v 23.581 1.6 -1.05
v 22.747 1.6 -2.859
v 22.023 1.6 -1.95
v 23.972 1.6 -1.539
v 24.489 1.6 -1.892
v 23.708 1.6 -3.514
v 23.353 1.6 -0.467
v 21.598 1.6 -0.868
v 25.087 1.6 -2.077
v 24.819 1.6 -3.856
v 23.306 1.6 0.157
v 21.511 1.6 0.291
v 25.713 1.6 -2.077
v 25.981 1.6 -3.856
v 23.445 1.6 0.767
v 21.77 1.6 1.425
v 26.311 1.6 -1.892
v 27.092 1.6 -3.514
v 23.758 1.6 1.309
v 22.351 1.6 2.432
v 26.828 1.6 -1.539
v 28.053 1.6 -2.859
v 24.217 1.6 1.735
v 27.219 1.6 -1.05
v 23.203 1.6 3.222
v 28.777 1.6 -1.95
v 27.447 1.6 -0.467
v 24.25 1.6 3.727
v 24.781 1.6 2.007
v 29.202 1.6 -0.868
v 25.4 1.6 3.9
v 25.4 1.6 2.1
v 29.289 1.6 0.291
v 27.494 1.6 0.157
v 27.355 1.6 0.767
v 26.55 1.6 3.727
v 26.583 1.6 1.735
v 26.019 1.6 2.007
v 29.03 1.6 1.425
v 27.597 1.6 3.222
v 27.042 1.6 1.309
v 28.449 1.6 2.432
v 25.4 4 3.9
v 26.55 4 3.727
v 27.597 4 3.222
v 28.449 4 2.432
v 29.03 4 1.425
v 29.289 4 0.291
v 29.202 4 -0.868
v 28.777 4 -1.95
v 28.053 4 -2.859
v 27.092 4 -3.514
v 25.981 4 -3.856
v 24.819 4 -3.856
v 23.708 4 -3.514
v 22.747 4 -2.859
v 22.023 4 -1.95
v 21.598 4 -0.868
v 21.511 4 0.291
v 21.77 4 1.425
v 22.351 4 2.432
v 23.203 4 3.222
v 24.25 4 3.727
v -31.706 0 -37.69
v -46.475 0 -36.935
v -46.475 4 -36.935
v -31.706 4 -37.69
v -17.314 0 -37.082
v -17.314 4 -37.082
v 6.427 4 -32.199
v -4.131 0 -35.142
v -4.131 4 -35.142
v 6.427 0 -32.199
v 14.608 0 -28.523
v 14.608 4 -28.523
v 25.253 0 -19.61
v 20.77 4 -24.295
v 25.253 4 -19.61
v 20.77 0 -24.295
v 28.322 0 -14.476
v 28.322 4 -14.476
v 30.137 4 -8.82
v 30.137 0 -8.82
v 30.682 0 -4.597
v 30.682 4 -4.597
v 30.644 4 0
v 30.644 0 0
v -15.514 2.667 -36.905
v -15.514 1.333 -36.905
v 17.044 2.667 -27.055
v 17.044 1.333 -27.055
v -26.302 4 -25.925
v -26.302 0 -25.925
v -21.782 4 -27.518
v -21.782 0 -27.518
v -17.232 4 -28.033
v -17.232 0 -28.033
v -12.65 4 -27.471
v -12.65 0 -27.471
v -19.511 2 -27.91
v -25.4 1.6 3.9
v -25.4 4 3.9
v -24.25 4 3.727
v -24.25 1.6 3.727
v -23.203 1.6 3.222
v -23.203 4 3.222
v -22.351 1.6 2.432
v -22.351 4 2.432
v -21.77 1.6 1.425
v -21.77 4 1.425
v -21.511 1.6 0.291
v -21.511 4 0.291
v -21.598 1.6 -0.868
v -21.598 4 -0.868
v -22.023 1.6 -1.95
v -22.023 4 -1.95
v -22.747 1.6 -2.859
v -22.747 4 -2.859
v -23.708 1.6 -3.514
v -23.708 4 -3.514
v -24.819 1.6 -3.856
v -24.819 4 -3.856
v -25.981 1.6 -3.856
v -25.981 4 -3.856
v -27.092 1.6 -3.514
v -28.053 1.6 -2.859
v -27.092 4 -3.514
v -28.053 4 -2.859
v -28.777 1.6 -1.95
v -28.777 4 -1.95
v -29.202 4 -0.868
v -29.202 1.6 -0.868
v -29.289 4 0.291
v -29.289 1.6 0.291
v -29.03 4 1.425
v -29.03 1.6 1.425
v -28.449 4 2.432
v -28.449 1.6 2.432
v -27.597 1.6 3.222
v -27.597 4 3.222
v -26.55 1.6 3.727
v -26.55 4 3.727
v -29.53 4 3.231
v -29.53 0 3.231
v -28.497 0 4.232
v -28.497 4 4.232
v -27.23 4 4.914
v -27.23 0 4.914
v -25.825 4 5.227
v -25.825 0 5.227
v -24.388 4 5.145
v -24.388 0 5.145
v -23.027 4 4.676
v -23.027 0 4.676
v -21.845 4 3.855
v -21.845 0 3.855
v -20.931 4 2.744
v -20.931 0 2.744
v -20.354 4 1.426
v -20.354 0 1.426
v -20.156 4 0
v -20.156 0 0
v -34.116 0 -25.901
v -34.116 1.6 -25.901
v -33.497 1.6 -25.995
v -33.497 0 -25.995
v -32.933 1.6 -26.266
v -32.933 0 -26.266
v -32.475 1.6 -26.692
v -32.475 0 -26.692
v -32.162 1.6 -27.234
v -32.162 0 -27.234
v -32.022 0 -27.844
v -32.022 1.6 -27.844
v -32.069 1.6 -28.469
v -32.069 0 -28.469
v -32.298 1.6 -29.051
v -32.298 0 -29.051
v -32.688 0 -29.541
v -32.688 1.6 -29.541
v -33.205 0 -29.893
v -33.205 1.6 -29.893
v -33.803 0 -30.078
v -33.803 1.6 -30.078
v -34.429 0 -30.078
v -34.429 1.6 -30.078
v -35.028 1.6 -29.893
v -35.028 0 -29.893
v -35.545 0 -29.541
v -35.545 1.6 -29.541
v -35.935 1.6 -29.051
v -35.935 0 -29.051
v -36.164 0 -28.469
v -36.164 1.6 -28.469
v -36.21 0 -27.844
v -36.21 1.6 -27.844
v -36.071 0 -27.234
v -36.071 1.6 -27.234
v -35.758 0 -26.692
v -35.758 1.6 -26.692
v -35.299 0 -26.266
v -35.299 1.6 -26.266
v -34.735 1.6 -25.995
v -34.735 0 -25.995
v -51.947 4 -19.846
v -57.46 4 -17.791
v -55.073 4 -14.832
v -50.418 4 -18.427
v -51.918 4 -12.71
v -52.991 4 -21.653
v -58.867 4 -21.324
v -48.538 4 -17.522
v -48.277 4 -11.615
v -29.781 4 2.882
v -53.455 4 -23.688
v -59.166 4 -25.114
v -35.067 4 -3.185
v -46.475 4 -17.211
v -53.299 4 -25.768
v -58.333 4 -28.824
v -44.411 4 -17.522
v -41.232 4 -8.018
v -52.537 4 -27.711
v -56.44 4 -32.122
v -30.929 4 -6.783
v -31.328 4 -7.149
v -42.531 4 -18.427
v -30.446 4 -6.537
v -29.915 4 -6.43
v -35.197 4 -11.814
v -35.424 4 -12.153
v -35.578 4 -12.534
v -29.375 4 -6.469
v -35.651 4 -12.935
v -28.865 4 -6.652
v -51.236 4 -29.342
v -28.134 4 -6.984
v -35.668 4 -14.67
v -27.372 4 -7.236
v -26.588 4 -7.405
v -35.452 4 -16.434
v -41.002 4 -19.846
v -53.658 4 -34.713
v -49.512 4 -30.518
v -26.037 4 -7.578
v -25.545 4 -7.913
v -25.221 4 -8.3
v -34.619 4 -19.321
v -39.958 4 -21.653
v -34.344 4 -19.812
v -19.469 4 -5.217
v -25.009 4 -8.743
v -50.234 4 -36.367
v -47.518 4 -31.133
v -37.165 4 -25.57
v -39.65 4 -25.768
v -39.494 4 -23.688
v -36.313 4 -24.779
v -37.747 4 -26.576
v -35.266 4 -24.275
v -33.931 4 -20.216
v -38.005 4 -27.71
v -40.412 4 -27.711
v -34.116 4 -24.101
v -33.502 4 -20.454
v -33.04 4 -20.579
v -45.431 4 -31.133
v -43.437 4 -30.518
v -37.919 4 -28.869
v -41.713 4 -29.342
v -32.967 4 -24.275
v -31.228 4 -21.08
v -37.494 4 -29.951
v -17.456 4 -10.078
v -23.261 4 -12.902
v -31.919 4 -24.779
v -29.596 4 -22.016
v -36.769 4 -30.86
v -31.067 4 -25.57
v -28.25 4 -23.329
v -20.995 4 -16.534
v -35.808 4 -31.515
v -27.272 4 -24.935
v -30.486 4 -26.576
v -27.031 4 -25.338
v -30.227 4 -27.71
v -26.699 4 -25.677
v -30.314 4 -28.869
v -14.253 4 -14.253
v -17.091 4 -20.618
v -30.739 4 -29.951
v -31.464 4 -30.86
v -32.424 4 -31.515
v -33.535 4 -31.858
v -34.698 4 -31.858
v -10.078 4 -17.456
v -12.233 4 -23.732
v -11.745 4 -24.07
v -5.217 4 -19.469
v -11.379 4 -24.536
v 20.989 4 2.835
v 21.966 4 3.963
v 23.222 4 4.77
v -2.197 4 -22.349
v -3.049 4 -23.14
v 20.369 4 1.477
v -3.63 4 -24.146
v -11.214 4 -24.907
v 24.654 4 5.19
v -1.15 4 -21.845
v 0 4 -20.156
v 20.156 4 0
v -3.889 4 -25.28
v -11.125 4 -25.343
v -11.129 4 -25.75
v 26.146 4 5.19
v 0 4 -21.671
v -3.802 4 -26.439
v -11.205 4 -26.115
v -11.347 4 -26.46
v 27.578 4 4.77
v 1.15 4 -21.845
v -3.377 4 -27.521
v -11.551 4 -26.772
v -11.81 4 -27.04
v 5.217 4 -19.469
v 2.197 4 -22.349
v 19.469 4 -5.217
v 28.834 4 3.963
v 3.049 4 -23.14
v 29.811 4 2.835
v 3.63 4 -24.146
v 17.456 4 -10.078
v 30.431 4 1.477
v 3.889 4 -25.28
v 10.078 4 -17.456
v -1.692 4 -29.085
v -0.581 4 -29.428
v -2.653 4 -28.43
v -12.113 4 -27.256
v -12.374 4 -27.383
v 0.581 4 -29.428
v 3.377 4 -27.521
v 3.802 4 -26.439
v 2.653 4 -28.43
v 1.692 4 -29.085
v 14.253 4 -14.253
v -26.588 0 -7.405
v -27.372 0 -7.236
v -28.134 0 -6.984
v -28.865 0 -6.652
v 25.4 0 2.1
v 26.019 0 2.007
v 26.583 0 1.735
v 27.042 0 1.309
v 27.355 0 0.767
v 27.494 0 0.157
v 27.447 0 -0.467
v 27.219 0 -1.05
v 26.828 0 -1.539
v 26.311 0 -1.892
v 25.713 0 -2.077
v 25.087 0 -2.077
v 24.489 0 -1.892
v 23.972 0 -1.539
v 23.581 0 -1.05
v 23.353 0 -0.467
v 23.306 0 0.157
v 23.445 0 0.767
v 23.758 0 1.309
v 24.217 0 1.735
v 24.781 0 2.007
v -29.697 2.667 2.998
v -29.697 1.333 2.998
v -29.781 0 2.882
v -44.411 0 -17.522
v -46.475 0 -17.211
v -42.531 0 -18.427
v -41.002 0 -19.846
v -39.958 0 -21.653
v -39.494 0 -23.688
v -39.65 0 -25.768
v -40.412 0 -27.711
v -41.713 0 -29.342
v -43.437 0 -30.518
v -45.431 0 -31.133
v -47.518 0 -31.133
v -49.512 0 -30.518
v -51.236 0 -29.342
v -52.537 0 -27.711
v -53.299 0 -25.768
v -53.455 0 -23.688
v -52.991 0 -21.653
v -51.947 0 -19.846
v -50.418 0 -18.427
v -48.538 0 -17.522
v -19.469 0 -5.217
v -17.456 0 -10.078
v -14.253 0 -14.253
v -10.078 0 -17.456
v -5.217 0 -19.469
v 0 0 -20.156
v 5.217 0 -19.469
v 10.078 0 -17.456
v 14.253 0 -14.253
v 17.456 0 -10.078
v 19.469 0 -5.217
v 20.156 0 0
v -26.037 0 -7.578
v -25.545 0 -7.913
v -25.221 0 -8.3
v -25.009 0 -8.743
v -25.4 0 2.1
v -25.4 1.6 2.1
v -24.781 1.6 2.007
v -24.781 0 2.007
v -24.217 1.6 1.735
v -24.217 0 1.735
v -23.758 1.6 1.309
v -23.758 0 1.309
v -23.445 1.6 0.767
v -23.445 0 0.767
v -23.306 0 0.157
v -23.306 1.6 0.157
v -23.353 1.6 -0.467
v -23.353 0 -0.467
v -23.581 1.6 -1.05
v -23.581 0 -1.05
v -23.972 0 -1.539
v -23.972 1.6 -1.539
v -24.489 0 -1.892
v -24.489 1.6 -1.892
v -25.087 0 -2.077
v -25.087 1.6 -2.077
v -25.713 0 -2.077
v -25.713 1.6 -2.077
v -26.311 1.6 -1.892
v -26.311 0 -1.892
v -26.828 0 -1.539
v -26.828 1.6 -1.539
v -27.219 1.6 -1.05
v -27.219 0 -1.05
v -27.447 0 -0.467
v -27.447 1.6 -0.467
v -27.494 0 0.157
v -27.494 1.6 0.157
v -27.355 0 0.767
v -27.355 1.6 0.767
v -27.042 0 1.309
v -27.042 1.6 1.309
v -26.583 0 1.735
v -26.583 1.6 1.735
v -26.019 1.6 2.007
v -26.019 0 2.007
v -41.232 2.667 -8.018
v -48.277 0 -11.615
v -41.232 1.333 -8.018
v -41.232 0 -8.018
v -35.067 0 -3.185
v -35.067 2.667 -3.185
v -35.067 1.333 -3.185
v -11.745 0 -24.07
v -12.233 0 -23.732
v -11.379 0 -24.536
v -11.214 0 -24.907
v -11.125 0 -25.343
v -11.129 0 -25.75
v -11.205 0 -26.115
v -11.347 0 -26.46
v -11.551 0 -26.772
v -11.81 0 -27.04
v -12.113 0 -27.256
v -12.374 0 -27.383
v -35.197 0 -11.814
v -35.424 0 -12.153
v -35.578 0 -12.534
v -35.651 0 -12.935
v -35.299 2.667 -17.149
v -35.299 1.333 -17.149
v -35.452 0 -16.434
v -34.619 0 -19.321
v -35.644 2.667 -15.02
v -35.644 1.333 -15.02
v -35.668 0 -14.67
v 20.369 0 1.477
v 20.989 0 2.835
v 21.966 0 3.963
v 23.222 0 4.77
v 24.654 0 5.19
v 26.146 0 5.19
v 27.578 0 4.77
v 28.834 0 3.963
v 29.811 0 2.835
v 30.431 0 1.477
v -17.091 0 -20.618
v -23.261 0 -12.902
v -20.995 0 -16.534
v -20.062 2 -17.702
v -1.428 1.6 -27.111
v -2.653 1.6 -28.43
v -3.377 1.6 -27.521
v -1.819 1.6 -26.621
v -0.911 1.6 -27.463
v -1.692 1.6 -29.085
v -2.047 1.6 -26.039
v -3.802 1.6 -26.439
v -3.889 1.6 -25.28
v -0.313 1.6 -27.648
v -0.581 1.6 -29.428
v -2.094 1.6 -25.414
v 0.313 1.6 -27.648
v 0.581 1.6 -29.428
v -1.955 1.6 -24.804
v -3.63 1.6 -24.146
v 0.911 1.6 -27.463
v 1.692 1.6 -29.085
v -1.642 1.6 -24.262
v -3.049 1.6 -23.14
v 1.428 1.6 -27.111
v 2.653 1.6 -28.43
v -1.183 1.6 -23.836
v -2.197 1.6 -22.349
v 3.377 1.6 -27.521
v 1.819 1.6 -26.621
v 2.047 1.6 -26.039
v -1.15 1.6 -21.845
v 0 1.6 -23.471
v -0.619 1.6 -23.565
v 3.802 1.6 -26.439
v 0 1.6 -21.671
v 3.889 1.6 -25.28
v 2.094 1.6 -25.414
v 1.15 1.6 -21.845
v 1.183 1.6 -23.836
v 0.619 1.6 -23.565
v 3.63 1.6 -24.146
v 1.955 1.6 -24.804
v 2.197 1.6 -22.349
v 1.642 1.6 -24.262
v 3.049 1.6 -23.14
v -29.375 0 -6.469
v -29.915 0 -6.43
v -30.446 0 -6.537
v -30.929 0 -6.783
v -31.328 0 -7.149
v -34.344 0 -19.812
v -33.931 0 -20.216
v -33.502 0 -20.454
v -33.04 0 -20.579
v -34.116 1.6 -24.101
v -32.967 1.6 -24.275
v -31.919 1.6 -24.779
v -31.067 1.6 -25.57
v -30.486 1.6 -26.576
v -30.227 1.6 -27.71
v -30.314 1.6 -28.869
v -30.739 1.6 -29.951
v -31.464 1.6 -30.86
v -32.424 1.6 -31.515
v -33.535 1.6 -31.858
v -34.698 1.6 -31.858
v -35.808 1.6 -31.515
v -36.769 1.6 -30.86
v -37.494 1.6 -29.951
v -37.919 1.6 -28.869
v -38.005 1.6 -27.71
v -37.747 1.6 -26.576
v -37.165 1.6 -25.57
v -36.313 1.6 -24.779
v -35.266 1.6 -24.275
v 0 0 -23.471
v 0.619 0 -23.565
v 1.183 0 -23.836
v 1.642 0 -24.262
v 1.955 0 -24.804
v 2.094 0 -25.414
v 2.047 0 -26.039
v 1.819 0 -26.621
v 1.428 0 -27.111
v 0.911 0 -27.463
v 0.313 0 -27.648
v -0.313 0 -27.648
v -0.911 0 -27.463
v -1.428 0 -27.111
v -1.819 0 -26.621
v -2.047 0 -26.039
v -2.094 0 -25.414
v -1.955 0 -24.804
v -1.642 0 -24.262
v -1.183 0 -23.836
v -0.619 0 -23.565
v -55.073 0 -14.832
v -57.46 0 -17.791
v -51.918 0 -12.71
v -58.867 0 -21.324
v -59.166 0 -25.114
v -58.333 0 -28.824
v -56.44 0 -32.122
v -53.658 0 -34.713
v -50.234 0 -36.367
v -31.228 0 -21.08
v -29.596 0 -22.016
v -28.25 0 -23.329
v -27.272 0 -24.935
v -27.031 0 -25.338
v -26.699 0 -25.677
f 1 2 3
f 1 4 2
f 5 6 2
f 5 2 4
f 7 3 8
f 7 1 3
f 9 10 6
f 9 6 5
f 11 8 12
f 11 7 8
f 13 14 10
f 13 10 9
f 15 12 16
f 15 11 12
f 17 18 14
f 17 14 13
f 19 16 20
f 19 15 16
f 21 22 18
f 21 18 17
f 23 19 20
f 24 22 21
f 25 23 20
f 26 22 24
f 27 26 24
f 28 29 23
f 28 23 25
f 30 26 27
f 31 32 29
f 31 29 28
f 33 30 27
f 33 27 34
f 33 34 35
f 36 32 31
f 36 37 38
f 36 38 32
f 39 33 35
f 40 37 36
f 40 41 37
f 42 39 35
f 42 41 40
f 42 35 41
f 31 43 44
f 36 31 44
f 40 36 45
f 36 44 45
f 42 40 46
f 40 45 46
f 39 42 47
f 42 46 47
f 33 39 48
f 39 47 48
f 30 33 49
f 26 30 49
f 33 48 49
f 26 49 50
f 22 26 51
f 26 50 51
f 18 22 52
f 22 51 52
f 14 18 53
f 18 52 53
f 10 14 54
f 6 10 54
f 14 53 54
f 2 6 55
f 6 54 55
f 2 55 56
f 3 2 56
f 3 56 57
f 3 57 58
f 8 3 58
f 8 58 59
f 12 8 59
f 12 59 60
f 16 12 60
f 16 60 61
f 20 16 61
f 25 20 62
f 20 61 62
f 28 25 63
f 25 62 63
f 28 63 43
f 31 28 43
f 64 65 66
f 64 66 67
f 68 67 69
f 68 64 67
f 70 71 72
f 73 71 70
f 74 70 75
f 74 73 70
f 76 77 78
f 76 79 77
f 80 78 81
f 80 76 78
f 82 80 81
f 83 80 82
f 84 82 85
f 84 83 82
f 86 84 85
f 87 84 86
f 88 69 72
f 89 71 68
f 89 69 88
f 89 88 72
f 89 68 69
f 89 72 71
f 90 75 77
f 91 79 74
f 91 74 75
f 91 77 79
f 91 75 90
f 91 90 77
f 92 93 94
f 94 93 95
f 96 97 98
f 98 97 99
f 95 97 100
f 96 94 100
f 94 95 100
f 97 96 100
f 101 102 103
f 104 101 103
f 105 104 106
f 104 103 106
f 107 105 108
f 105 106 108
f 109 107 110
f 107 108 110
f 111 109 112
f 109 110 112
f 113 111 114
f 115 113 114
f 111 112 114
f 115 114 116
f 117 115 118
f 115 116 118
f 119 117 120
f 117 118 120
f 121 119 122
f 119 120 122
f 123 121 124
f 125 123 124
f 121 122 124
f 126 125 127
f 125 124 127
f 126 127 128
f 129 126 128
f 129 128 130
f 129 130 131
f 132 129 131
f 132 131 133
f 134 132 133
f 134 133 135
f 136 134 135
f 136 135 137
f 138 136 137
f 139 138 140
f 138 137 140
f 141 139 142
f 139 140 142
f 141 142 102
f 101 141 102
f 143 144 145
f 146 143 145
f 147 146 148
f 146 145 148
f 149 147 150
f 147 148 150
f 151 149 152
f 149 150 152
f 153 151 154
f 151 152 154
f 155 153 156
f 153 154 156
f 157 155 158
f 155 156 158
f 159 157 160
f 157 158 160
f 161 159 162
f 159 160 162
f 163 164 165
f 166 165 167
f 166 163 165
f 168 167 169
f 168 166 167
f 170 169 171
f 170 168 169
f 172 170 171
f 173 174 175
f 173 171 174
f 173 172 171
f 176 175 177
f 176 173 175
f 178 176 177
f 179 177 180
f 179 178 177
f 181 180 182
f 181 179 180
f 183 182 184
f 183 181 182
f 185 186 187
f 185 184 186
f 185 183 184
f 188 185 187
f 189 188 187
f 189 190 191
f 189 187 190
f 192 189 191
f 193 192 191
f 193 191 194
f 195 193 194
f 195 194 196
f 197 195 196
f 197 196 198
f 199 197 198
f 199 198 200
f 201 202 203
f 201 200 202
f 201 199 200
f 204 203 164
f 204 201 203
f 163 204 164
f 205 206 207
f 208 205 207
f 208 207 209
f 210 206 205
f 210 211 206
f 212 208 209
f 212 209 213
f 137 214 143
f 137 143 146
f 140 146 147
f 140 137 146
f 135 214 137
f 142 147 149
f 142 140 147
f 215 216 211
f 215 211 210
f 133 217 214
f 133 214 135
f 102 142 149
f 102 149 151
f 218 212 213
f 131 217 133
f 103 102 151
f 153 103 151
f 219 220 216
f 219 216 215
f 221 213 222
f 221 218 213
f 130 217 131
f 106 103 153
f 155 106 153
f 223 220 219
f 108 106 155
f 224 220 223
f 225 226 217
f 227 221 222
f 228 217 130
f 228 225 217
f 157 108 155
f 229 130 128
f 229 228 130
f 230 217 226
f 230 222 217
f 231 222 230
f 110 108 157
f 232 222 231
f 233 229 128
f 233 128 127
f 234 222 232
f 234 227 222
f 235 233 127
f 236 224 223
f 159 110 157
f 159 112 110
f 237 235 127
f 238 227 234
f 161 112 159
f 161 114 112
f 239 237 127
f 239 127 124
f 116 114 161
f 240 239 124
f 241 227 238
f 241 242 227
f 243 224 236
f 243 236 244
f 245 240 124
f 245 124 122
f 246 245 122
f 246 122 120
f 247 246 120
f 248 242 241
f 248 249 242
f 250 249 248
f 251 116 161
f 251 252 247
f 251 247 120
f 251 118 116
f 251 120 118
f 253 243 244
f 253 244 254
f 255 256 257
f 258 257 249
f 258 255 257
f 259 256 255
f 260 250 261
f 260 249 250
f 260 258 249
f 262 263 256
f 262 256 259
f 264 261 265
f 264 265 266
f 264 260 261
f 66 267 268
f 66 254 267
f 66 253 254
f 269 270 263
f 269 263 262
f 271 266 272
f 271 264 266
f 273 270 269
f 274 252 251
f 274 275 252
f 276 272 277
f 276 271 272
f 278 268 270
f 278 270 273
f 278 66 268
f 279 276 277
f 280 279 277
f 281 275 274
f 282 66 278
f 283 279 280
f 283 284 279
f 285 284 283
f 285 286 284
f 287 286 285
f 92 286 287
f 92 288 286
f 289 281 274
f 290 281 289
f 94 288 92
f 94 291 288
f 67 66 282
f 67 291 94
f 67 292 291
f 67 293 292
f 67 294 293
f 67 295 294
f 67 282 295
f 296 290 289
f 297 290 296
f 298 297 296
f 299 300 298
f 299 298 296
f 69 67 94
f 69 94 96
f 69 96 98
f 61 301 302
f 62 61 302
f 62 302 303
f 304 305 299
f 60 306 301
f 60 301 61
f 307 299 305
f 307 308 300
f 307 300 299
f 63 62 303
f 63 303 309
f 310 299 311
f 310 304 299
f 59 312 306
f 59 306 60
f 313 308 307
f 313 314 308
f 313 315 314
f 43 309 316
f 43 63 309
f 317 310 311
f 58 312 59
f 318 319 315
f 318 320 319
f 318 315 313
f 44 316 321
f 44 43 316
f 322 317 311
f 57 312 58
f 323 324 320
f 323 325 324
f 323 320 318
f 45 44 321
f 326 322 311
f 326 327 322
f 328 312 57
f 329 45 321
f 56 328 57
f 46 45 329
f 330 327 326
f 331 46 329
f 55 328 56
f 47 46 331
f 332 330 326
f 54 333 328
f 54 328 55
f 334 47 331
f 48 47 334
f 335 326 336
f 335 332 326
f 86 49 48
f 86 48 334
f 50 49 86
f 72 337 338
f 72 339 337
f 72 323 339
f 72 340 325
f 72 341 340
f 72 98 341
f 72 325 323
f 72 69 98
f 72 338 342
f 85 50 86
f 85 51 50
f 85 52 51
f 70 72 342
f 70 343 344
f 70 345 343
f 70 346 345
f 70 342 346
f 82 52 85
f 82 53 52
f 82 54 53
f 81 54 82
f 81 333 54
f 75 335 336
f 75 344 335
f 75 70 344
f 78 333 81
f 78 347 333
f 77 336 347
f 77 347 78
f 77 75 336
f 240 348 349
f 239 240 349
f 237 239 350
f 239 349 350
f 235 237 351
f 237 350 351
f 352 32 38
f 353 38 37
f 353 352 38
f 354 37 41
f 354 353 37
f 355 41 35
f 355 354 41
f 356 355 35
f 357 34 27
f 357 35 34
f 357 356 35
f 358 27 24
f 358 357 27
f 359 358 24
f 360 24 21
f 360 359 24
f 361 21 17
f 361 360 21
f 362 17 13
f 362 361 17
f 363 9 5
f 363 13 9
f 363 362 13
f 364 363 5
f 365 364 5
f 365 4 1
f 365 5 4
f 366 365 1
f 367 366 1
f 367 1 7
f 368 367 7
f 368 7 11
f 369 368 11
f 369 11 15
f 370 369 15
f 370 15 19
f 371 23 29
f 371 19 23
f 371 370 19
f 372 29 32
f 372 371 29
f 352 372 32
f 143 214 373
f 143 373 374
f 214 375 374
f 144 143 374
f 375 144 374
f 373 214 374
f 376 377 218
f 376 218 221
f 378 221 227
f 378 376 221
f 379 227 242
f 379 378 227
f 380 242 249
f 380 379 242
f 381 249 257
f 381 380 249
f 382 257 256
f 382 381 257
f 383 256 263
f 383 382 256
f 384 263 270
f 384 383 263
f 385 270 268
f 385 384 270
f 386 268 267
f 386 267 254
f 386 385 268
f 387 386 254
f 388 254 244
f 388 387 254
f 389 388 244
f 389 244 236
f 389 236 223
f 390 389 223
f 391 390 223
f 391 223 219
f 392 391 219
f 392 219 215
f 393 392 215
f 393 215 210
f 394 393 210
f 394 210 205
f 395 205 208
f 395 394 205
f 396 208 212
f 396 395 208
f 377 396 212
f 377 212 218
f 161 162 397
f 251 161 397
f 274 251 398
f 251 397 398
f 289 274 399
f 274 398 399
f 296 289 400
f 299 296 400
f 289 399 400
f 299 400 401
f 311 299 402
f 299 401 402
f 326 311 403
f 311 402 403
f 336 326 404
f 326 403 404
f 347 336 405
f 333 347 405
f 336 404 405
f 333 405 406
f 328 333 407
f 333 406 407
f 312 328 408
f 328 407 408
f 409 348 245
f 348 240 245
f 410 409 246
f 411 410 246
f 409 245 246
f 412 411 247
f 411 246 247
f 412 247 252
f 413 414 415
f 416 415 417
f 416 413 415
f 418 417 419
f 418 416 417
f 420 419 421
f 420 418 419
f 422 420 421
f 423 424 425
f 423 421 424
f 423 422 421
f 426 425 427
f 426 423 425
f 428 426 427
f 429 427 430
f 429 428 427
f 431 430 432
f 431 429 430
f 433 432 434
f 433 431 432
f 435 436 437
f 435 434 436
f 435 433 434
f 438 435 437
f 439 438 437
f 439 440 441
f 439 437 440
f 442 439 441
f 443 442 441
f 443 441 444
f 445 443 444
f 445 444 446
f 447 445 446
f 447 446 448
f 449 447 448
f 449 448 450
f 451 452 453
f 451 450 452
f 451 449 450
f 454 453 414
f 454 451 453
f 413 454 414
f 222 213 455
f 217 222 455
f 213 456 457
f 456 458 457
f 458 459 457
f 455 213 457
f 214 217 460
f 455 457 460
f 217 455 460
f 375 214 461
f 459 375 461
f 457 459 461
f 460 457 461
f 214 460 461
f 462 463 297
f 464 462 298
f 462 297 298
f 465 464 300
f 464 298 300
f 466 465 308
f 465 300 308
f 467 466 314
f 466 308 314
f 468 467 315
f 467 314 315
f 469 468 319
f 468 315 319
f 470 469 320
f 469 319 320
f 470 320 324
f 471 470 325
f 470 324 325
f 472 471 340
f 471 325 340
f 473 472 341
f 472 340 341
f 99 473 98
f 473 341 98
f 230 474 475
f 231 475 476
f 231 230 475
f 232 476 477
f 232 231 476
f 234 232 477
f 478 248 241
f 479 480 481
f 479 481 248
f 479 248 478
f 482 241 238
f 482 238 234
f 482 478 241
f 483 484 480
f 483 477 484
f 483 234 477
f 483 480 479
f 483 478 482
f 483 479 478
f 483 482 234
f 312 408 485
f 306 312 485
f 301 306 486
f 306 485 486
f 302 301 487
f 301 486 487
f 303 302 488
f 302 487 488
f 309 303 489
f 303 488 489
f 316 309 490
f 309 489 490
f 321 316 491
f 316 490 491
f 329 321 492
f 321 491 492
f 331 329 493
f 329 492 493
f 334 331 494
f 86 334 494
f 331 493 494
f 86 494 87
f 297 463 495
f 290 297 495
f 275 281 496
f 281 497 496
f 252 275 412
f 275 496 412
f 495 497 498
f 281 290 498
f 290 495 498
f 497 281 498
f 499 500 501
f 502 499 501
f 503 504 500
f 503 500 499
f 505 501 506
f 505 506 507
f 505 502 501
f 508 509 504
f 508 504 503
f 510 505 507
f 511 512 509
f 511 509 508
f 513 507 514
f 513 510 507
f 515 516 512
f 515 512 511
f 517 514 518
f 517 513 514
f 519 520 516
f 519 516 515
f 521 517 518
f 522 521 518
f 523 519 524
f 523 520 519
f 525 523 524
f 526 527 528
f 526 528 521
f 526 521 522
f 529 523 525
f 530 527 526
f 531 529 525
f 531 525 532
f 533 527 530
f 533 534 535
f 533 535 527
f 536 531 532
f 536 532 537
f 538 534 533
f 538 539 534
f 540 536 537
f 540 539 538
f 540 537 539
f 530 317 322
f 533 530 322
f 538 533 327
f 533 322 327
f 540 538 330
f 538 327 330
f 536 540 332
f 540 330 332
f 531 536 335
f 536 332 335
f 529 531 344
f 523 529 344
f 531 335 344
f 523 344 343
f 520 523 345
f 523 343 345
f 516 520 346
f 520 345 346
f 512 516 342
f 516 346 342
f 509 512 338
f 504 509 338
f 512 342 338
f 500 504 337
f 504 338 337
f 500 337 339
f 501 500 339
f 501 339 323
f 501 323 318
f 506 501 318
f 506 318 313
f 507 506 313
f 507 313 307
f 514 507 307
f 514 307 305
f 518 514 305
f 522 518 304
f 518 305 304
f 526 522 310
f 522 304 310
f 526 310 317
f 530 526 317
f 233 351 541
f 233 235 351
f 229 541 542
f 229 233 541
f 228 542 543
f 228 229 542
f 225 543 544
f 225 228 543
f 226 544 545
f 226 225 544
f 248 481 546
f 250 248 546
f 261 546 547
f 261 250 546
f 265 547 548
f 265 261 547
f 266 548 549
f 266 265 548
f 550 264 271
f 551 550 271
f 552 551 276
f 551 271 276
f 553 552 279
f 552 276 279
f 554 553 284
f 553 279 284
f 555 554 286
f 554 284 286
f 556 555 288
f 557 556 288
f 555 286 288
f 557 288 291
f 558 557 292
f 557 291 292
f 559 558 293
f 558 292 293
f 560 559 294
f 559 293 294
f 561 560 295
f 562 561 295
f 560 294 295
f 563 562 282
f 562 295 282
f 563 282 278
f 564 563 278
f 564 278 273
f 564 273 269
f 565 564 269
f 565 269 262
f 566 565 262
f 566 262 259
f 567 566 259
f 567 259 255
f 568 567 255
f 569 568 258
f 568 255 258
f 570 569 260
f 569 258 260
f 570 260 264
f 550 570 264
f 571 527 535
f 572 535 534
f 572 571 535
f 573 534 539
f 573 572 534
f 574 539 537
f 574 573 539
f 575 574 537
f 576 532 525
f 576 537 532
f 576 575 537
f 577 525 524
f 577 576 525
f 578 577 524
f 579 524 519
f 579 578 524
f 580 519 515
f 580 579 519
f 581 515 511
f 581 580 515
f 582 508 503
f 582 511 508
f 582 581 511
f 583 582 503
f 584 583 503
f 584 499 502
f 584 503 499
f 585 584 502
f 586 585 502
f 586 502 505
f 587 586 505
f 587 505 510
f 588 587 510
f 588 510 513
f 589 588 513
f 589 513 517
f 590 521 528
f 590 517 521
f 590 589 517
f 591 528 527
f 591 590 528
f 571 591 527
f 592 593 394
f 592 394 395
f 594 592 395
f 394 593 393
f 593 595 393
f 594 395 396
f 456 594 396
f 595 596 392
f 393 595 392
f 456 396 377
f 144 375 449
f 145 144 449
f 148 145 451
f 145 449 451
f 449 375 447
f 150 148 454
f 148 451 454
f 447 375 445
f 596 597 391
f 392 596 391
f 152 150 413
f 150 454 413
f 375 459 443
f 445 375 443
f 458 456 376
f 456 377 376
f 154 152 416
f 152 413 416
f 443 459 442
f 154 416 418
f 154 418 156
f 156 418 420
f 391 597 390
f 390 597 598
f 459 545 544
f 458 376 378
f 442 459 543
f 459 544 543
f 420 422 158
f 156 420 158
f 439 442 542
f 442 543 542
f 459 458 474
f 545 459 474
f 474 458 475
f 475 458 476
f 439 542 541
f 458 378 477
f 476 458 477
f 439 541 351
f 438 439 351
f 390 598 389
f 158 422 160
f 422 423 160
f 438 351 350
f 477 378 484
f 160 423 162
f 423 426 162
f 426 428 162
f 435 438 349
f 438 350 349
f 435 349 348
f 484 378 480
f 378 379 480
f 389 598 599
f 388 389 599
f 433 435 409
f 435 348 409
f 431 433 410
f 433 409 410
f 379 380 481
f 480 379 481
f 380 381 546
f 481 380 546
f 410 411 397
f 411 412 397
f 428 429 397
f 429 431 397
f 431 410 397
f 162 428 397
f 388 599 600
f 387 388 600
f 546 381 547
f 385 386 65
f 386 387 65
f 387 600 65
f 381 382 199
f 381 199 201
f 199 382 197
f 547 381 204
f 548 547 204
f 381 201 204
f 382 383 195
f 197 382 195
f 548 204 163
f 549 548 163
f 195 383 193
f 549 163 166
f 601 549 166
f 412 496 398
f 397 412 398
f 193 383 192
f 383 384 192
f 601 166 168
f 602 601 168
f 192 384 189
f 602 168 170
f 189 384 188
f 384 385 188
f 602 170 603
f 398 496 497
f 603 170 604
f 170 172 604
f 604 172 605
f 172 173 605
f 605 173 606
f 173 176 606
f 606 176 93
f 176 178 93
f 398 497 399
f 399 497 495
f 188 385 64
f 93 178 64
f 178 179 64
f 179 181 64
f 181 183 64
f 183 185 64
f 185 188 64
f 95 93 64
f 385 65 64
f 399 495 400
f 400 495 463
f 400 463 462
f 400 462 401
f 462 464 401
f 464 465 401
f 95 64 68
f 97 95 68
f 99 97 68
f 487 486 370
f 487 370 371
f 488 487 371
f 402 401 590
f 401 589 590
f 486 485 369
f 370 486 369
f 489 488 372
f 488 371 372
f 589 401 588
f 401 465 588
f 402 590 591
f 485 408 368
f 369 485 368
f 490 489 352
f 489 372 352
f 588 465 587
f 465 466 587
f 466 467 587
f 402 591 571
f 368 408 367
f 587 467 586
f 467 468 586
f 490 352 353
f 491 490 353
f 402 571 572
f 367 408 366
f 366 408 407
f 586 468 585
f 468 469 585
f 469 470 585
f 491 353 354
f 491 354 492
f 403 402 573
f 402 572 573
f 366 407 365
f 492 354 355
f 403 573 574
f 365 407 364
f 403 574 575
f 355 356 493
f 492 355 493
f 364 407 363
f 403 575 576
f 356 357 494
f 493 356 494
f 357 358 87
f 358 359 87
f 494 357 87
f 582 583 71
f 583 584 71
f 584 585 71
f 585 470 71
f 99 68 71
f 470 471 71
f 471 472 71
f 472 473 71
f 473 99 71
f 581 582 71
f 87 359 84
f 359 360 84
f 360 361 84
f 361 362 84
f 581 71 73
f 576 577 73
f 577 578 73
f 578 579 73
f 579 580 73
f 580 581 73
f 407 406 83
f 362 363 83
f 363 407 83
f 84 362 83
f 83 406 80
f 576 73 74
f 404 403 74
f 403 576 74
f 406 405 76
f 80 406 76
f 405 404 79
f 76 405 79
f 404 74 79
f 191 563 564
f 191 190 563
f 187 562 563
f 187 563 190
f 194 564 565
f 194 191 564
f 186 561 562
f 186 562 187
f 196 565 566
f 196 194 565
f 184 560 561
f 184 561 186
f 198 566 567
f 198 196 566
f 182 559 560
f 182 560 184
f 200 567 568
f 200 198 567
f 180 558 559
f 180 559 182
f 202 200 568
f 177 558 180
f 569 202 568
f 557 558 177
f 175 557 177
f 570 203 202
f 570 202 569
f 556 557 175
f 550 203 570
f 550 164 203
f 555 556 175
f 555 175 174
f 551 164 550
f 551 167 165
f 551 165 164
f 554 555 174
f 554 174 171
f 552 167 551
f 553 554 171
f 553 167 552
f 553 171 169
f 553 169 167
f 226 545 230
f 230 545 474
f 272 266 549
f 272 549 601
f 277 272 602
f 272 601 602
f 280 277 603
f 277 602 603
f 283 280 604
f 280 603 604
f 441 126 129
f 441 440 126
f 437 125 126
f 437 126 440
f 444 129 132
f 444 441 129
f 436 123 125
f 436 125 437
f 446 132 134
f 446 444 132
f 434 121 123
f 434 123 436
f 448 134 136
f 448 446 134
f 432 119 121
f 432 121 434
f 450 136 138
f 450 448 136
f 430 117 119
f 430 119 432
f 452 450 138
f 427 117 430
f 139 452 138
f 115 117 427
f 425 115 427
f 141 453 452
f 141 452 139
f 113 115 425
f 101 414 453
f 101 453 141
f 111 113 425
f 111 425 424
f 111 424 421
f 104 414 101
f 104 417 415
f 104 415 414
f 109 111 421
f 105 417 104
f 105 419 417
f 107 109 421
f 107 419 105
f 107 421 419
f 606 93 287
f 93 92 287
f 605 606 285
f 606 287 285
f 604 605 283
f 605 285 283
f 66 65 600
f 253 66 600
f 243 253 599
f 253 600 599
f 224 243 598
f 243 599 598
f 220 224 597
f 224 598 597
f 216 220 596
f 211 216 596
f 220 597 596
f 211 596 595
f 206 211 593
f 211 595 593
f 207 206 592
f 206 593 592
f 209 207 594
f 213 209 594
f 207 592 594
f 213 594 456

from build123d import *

# Parameters (mm, degrees)
SKETCH1_R           = 2.1
SKETCH1_R_2         = 7
BOSS_EXTRUDE1_DEPTH = 4
FILLET1_R           = 2
SKETCH2_R           = 3.9
CUT_EXTRUDE1_DEPTH  = 2.4


with BuildPart() as part:
    # Sketch1 → Boss-Extrude1 (new body)
    with BuildSketch(Plane(origin=(0, 0, 0), x_dir=(1, 0, 0), z_dir=(0, 1, 0))):
        with BuildLine():
            ThreePointArc((-20.156225815, 0), (0, 20.156225815), (20.156225815, 0))
            ThreePointArc((20.156225815, 0), (25.4, -5.243774185), (30.643774185, 0))
            add(Edge.make_bspline(
                [(-46.474516908, 36.934762739), (-23.164206568, 39.351897946), (33.373901801, 38.120150773), (30.643774185, 0)],
                knots=[0, 0, 0, 0, 1, 1, 1, 1], degree=3))
            ThreePointArc((-46.474516908, 36.934762739), (-59.166363236, 25.114100216), (-48.276532762, 11.615114404))
            add(Edge.make_bspline(
                [(-48.276532762, 11.615114404), (-40.793059369, 8.635332343), (-34.627763453, 3.802891886), (-29.780645012, -2.882206965)],
                knots=[0.158174001, 0.158174001, 0.158174001, 0.158174001, 0.985694322, 0.985694322, 0.985694322, 0.985694322], degree=3))
            add(Edge.make_bspline(
                [(-29.780645012, -2.882206965), (-29.696850917, -2.997774969), (-29.613450765, -3.113896649), (-29.530444557, -3.230572003)],
                knots=[0.985694322, 0.985694322, 0.985694322, 0.985694322, 1, 1, 1, 1], degree=3))
            ThreePointArc((-29.530444557, -3.230572003), (-23.691484685, -4.957634831), (-20.156225815, 0))
        make_face()
        with Locations(Location((-25.4, 0, 0), (0, 0, 270))):
            Circle(SKETCH1_R, mode=Mode.SUBTRACT)
        with Locations(Location((25.4, 0, 0), (0, 0, 270))):
            Circle(SKETCH1_R, mode=Mode.SUBTRACT)
        with Locations(Location((-46.474516908, 24.210813251, 0), (0, 0, 270))):
            Circle(SKETCH1_R_2, mode=Mode.SUBTRACT)
        with BuildLine():
            Line((-30.18742995, 5.773258566), (-35.582829026, 12.279679392))
            add(Edge.make_bspline(
                [(-34.116347467, 20.501234406), (-35.438334408, 17.651696826), (-35.927161595, 14.911178488), (-35.582829026, 12.279679392)],
                knots=[0, 0, 0, 0, 0.482948313, 0.482948313, 0.482948313, 0.482948313], degree=3))
            ThreePointArc((-34.116347467, 20.501234406), (-29.755996604, 21.898993805), (-27.020904781, 25.57127698))
            add(Edge.make_bspline(
                [(-27.020904781, 25.57127698), (-17.402553682, 30.495527598), (-7.5, 25.57127698)],
                knots=[0, 0, 0, 1, 1, 1], degree=2))
            add(Edge.make_bspline(
                [(-7.5, 25.57127698), (-21.293728183, 21.457376491), (-25.4, 7.5)],
                knots=[0, 0, 0, 1, 1, 1], degree=2))
            ThreePointArc((-25.4, 7.5), (-27.944657222, 7.0551201), (-30.18742995, 5.773258566))
        make_face(mode=Mode.SUBTRACT)
        with Locations(Location((-34.116347467, 28.001234406, 0), (0, 0, 270))):
            Circle(SKETCH1_R, mode=Mode.SUBTRACT)
        with Locations(Location((0, 25.57127698, 0), (0, 0, 270))):
            Circle(SKETCH1_R, mode=Mode.SUBTRACT)
    extrude(amount=BOSS_EXTRUDE1_DEPTH)

    # Fillet1
    fillet1_edges = [part.edges().sort_by_distance(p)[0] for p in [
        (-34.116347467, 2, -20.501234406),
        (-35.582829026, 2, -12.279679392),
        (-30.18742995, 2, -5.773258566),
        (-25.4, 2, -7.5),
        (-7.5, 2, -25.57127698),
        (-27.020904781, 2, -25.57127698),
    ]]
    fillet(fillet1_edges, radius=FILLET1_R)

    # Sketch2 → Cut-Extrude1 (cut)
    with BuildSketch(Plane(origin=(0, 4, 0), x_dir=(1, 0, 0), z_dir=(0, 1, 0))):
        with Locations(Location((-34.116347467, 28.001234406, 0), (0, 0, 270))):
            Circle(SKETCH2_R)
        with Locations(Location((0, 25.57127698, 0), (0, 0, 270))):
            Circle(SKETCH2_R)
        with Locations(Location((-25.4, 0, 0), (0, 0, 270))):
            Circle(SKETCH2_R)
        with Locations(Location((25.4, 0, 0), (0, 0, 270))):
            Circle(SKETCH2_R)
    extrude(amount=-CUT_EXTRUDE1_DEPTH, mode=Mode.SUBTRACT)


solid = part.part
